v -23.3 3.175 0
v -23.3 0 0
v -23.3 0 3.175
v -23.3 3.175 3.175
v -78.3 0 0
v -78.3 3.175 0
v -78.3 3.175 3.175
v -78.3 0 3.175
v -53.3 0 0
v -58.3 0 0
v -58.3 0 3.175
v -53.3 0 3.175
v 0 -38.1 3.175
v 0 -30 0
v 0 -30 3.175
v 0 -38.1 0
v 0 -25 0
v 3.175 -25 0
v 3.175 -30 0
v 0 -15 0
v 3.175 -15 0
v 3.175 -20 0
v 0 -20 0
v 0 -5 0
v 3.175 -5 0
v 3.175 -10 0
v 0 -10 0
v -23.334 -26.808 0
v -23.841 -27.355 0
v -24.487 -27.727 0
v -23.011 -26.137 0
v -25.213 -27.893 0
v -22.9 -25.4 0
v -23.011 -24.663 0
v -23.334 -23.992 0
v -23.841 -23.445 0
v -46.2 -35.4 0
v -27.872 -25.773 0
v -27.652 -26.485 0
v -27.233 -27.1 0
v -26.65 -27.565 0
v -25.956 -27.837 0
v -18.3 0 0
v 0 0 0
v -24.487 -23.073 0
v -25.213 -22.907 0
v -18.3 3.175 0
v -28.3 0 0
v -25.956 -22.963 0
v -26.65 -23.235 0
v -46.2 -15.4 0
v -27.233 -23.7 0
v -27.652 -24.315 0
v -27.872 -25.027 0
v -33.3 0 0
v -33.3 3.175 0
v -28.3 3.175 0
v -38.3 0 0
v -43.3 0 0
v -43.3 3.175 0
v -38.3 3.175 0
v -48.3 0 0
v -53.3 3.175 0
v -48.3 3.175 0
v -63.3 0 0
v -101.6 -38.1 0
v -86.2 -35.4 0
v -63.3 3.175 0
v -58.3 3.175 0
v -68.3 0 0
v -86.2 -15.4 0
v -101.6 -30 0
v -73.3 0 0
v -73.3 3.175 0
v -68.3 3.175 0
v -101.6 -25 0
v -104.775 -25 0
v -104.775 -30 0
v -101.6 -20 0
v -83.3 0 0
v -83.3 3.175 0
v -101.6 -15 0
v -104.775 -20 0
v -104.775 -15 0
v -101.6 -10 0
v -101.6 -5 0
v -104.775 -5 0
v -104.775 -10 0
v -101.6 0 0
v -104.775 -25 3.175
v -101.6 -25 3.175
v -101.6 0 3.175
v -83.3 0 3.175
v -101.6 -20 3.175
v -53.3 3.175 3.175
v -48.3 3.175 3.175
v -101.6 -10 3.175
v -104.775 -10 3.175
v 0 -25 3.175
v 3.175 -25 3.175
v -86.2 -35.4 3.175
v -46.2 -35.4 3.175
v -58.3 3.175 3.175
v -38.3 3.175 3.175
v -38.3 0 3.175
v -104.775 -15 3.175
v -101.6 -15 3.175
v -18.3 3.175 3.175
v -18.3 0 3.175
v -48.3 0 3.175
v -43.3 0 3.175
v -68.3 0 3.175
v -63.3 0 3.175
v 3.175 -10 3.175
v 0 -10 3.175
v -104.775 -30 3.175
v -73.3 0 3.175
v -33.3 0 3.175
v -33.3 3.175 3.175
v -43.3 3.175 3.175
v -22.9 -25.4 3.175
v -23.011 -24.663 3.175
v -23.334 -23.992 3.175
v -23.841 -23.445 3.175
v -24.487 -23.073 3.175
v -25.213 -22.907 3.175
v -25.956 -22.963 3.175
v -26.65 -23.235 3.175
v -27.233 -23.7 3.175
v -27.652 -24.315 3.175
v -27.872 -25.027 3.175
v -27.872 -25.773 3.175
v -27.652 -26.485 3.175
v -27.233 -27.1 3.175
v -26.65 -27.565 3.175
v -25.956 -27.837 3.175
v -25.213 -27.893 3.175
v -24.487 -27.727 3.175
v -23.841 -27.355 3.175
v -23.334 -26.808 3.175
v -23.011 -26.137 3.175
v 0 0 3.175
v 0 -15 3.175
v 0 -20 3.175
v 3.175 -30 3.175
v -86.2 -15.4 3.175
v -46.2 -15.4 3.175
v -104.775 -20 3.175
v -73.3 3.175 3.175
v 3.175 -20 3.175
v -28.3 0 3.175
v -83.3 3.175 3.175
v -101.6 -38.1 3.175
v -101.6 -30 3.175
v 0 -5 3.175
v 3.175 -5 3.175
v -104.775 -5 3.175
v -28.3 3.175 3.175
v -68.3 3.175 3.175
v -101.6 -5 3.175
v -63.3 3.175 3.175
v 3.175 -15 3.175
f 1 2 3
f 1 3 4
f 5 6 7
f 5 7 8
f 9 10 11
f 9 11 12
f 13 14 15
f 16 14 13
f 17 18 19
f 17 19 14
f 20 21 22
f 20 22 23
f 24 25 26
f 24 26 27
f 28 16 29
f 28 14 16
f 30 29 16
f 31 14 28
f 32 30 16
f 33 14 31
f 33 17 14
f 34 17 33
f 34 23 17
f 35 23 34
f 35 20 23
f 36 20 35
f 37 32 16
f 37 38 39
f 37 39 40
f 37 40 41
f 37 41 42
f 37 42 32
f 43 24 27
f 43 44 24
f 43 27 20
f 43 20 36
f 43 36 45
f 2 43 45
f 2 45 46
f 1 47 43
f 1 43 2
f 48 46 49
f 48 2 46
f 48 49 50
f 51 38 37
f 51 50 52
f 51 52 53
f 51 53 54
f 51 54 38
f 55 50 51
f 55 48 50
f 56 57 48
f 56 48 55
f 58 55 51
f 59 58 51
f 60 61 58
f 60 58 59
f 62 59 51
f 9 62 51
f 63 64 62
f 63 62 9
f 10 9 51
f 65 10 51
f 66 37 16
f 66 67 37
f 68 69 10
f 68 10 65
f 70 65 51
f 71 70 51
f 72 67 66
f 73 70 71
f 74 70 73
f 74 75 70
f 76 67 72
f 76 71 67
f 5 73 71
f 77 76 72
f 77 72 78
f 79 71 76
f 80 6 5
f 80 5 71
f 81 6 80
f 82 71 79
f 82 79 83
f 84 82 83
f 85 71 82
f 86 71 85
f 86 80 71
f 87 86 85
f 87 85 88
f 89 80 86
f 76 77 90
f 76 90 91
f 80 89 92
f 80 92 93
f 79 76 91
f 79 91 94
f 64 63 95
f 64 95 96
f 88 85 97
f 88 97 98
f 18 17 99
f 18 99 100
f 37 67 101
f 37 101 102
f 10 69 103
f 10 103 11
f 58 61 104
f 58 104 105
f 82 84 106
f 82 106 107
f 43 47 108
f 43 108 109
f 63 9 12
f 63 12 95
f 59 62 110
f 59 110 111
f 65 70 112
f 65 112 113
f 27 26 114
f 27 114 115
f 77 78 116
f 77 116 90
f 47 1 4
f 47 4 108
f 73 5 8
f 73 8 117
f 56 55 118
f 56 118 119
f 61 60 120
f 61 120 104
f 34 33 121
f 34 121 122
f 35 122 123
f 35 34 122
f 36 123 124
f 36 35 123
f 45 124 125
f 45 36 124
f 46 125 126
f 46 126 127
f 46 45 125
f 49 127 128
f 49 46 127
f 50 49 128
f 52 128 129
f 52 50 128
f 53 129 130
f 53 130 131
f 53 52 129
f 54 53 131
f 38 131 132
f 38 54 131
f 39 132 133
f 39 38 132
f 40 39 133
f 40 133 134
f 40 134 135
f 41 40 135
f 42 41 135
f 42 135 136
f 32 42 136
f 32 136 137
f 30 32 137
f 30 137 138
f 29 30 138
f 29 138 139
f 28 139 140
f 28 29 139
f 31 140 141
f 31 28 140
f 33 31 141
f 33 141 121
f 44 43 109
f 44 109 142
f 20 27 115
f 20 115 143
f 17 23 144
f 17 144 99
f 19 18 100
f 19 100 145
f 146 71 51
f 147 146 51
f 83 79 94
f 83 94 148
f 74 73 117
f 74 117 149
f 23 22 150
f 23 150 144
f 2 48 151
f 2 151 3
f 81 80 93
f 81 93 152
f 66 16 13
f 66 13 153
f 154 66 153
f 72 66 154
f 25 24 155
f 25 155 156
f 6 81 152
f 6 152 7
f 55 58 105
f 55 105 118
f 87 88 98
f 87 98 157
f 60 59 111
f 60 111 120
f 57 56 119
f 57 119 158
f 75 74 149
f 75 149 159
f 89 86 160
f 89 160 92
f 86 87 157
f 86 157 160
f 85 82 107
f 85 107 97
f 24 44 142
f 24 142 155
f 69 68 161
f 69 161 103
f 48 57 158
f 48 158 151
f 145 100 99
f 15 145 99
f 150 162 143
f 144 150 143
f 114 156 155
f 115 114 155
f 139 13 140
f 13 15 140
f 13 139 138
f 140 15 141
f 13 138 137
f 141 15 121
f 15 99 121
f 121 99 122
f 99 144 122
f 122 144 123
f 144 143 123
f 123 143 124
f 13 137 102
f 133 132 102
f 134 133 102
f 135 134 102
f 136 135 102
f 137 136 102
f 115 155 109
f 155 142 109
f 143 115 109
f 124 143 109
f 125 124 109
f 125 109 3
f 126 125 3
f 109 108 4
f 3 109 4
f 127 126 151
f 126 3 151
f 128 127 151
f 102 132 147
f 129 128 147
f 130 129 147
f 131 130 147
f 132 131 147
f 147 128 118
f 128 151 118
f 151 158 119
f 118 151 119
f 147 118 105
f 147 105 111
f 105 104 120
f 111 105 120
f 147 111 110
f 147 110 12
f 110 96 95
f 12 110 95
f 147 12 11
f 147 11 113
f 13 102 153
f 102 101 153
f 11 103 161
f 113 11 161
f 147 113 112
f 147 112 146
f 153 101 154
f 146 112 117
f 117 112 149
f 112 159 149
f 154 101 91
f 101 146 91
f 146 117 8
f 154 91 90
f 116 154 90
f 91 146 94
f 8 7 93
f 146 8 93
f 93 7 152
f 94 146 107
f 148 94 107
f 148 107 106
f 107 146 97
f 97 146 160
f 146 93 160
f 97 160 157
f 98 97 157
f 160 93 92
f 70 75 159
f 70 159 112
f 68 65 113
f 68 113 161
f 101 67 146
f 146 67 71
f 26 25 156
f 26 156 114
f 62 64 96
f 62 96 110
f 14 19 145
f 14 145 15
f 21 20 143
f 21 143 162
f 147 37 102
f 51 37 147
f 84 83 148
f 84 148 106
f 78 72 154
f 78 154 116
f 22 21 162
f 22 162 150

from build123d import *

# Parameters (mm, degrees)
SKETCH1_R           = 2.5
SKETCH1_W           = 40
SKETCH1_H           = 20
BOSS_EXTRUDE1_DEPTH = 3.175


with BuildPart() as part:
    # Sketch1 → Boss-Extrude1 (new body)
    with BuildSketch(Plane.XY):
        Polygon((-101.6, 0), (-83.3, 0), (-83.3, 3.175), (-78.3, 3.175), (-78.3, 0), (-73.3, 0), (-73.3, 3.175), (-68.3, 3.175), (-68.3, 0), (-63.3, 0), (-63.3, 3.175), (-58.3, 3.175), (-58.3, 0), (-53.3, 0), (-53.3, 3.175), (-48.3, 3.175), (-48.3, 0), (-43.3, 0), (-43.3, 3.175), (-38.3, 3.175), (-38.3, 0), (-33.3, 0), (-33.3, 3.175), (-28.3, 3.175), (-28.3, 0), (-23.3, 0), (-23.3, 3.175), (-18.3, 3.175), (-18.3, 0), (0, 0), (0, -5), (3.175, -5), (3.175, -10), (0, -10), (0, -15), (3.175, -15), (3.175, -20), (0, -20), (0, -25), (3.175, -25), (3.175, -30), (0, -30), (0, -38.1), (-101.6, -38.1), (-101.6, -30), (-104.775, -30), (-104.775, -25), (-101.6, -25), (-101.6, -20), (-104.775, -20), (-104.775, -15), (-101.6, -15), (-101.6, -10), (-104.775, -10), (-104.775, -5), (-101.6, -5), align=None)
        with Locations((-25.4, -25.4)):
            Circle(SKETCH1_R, mode=Mode.SUBTRACT)
        with Locations((-66.2, -25.4)):
            Rectangle(SKETCH1_W, SKETCH1_H, mode=Mode.SUBTRACT)
    extrude(amount=BOSS_EXTRUDE1_DEPTH)


solid = part.part
